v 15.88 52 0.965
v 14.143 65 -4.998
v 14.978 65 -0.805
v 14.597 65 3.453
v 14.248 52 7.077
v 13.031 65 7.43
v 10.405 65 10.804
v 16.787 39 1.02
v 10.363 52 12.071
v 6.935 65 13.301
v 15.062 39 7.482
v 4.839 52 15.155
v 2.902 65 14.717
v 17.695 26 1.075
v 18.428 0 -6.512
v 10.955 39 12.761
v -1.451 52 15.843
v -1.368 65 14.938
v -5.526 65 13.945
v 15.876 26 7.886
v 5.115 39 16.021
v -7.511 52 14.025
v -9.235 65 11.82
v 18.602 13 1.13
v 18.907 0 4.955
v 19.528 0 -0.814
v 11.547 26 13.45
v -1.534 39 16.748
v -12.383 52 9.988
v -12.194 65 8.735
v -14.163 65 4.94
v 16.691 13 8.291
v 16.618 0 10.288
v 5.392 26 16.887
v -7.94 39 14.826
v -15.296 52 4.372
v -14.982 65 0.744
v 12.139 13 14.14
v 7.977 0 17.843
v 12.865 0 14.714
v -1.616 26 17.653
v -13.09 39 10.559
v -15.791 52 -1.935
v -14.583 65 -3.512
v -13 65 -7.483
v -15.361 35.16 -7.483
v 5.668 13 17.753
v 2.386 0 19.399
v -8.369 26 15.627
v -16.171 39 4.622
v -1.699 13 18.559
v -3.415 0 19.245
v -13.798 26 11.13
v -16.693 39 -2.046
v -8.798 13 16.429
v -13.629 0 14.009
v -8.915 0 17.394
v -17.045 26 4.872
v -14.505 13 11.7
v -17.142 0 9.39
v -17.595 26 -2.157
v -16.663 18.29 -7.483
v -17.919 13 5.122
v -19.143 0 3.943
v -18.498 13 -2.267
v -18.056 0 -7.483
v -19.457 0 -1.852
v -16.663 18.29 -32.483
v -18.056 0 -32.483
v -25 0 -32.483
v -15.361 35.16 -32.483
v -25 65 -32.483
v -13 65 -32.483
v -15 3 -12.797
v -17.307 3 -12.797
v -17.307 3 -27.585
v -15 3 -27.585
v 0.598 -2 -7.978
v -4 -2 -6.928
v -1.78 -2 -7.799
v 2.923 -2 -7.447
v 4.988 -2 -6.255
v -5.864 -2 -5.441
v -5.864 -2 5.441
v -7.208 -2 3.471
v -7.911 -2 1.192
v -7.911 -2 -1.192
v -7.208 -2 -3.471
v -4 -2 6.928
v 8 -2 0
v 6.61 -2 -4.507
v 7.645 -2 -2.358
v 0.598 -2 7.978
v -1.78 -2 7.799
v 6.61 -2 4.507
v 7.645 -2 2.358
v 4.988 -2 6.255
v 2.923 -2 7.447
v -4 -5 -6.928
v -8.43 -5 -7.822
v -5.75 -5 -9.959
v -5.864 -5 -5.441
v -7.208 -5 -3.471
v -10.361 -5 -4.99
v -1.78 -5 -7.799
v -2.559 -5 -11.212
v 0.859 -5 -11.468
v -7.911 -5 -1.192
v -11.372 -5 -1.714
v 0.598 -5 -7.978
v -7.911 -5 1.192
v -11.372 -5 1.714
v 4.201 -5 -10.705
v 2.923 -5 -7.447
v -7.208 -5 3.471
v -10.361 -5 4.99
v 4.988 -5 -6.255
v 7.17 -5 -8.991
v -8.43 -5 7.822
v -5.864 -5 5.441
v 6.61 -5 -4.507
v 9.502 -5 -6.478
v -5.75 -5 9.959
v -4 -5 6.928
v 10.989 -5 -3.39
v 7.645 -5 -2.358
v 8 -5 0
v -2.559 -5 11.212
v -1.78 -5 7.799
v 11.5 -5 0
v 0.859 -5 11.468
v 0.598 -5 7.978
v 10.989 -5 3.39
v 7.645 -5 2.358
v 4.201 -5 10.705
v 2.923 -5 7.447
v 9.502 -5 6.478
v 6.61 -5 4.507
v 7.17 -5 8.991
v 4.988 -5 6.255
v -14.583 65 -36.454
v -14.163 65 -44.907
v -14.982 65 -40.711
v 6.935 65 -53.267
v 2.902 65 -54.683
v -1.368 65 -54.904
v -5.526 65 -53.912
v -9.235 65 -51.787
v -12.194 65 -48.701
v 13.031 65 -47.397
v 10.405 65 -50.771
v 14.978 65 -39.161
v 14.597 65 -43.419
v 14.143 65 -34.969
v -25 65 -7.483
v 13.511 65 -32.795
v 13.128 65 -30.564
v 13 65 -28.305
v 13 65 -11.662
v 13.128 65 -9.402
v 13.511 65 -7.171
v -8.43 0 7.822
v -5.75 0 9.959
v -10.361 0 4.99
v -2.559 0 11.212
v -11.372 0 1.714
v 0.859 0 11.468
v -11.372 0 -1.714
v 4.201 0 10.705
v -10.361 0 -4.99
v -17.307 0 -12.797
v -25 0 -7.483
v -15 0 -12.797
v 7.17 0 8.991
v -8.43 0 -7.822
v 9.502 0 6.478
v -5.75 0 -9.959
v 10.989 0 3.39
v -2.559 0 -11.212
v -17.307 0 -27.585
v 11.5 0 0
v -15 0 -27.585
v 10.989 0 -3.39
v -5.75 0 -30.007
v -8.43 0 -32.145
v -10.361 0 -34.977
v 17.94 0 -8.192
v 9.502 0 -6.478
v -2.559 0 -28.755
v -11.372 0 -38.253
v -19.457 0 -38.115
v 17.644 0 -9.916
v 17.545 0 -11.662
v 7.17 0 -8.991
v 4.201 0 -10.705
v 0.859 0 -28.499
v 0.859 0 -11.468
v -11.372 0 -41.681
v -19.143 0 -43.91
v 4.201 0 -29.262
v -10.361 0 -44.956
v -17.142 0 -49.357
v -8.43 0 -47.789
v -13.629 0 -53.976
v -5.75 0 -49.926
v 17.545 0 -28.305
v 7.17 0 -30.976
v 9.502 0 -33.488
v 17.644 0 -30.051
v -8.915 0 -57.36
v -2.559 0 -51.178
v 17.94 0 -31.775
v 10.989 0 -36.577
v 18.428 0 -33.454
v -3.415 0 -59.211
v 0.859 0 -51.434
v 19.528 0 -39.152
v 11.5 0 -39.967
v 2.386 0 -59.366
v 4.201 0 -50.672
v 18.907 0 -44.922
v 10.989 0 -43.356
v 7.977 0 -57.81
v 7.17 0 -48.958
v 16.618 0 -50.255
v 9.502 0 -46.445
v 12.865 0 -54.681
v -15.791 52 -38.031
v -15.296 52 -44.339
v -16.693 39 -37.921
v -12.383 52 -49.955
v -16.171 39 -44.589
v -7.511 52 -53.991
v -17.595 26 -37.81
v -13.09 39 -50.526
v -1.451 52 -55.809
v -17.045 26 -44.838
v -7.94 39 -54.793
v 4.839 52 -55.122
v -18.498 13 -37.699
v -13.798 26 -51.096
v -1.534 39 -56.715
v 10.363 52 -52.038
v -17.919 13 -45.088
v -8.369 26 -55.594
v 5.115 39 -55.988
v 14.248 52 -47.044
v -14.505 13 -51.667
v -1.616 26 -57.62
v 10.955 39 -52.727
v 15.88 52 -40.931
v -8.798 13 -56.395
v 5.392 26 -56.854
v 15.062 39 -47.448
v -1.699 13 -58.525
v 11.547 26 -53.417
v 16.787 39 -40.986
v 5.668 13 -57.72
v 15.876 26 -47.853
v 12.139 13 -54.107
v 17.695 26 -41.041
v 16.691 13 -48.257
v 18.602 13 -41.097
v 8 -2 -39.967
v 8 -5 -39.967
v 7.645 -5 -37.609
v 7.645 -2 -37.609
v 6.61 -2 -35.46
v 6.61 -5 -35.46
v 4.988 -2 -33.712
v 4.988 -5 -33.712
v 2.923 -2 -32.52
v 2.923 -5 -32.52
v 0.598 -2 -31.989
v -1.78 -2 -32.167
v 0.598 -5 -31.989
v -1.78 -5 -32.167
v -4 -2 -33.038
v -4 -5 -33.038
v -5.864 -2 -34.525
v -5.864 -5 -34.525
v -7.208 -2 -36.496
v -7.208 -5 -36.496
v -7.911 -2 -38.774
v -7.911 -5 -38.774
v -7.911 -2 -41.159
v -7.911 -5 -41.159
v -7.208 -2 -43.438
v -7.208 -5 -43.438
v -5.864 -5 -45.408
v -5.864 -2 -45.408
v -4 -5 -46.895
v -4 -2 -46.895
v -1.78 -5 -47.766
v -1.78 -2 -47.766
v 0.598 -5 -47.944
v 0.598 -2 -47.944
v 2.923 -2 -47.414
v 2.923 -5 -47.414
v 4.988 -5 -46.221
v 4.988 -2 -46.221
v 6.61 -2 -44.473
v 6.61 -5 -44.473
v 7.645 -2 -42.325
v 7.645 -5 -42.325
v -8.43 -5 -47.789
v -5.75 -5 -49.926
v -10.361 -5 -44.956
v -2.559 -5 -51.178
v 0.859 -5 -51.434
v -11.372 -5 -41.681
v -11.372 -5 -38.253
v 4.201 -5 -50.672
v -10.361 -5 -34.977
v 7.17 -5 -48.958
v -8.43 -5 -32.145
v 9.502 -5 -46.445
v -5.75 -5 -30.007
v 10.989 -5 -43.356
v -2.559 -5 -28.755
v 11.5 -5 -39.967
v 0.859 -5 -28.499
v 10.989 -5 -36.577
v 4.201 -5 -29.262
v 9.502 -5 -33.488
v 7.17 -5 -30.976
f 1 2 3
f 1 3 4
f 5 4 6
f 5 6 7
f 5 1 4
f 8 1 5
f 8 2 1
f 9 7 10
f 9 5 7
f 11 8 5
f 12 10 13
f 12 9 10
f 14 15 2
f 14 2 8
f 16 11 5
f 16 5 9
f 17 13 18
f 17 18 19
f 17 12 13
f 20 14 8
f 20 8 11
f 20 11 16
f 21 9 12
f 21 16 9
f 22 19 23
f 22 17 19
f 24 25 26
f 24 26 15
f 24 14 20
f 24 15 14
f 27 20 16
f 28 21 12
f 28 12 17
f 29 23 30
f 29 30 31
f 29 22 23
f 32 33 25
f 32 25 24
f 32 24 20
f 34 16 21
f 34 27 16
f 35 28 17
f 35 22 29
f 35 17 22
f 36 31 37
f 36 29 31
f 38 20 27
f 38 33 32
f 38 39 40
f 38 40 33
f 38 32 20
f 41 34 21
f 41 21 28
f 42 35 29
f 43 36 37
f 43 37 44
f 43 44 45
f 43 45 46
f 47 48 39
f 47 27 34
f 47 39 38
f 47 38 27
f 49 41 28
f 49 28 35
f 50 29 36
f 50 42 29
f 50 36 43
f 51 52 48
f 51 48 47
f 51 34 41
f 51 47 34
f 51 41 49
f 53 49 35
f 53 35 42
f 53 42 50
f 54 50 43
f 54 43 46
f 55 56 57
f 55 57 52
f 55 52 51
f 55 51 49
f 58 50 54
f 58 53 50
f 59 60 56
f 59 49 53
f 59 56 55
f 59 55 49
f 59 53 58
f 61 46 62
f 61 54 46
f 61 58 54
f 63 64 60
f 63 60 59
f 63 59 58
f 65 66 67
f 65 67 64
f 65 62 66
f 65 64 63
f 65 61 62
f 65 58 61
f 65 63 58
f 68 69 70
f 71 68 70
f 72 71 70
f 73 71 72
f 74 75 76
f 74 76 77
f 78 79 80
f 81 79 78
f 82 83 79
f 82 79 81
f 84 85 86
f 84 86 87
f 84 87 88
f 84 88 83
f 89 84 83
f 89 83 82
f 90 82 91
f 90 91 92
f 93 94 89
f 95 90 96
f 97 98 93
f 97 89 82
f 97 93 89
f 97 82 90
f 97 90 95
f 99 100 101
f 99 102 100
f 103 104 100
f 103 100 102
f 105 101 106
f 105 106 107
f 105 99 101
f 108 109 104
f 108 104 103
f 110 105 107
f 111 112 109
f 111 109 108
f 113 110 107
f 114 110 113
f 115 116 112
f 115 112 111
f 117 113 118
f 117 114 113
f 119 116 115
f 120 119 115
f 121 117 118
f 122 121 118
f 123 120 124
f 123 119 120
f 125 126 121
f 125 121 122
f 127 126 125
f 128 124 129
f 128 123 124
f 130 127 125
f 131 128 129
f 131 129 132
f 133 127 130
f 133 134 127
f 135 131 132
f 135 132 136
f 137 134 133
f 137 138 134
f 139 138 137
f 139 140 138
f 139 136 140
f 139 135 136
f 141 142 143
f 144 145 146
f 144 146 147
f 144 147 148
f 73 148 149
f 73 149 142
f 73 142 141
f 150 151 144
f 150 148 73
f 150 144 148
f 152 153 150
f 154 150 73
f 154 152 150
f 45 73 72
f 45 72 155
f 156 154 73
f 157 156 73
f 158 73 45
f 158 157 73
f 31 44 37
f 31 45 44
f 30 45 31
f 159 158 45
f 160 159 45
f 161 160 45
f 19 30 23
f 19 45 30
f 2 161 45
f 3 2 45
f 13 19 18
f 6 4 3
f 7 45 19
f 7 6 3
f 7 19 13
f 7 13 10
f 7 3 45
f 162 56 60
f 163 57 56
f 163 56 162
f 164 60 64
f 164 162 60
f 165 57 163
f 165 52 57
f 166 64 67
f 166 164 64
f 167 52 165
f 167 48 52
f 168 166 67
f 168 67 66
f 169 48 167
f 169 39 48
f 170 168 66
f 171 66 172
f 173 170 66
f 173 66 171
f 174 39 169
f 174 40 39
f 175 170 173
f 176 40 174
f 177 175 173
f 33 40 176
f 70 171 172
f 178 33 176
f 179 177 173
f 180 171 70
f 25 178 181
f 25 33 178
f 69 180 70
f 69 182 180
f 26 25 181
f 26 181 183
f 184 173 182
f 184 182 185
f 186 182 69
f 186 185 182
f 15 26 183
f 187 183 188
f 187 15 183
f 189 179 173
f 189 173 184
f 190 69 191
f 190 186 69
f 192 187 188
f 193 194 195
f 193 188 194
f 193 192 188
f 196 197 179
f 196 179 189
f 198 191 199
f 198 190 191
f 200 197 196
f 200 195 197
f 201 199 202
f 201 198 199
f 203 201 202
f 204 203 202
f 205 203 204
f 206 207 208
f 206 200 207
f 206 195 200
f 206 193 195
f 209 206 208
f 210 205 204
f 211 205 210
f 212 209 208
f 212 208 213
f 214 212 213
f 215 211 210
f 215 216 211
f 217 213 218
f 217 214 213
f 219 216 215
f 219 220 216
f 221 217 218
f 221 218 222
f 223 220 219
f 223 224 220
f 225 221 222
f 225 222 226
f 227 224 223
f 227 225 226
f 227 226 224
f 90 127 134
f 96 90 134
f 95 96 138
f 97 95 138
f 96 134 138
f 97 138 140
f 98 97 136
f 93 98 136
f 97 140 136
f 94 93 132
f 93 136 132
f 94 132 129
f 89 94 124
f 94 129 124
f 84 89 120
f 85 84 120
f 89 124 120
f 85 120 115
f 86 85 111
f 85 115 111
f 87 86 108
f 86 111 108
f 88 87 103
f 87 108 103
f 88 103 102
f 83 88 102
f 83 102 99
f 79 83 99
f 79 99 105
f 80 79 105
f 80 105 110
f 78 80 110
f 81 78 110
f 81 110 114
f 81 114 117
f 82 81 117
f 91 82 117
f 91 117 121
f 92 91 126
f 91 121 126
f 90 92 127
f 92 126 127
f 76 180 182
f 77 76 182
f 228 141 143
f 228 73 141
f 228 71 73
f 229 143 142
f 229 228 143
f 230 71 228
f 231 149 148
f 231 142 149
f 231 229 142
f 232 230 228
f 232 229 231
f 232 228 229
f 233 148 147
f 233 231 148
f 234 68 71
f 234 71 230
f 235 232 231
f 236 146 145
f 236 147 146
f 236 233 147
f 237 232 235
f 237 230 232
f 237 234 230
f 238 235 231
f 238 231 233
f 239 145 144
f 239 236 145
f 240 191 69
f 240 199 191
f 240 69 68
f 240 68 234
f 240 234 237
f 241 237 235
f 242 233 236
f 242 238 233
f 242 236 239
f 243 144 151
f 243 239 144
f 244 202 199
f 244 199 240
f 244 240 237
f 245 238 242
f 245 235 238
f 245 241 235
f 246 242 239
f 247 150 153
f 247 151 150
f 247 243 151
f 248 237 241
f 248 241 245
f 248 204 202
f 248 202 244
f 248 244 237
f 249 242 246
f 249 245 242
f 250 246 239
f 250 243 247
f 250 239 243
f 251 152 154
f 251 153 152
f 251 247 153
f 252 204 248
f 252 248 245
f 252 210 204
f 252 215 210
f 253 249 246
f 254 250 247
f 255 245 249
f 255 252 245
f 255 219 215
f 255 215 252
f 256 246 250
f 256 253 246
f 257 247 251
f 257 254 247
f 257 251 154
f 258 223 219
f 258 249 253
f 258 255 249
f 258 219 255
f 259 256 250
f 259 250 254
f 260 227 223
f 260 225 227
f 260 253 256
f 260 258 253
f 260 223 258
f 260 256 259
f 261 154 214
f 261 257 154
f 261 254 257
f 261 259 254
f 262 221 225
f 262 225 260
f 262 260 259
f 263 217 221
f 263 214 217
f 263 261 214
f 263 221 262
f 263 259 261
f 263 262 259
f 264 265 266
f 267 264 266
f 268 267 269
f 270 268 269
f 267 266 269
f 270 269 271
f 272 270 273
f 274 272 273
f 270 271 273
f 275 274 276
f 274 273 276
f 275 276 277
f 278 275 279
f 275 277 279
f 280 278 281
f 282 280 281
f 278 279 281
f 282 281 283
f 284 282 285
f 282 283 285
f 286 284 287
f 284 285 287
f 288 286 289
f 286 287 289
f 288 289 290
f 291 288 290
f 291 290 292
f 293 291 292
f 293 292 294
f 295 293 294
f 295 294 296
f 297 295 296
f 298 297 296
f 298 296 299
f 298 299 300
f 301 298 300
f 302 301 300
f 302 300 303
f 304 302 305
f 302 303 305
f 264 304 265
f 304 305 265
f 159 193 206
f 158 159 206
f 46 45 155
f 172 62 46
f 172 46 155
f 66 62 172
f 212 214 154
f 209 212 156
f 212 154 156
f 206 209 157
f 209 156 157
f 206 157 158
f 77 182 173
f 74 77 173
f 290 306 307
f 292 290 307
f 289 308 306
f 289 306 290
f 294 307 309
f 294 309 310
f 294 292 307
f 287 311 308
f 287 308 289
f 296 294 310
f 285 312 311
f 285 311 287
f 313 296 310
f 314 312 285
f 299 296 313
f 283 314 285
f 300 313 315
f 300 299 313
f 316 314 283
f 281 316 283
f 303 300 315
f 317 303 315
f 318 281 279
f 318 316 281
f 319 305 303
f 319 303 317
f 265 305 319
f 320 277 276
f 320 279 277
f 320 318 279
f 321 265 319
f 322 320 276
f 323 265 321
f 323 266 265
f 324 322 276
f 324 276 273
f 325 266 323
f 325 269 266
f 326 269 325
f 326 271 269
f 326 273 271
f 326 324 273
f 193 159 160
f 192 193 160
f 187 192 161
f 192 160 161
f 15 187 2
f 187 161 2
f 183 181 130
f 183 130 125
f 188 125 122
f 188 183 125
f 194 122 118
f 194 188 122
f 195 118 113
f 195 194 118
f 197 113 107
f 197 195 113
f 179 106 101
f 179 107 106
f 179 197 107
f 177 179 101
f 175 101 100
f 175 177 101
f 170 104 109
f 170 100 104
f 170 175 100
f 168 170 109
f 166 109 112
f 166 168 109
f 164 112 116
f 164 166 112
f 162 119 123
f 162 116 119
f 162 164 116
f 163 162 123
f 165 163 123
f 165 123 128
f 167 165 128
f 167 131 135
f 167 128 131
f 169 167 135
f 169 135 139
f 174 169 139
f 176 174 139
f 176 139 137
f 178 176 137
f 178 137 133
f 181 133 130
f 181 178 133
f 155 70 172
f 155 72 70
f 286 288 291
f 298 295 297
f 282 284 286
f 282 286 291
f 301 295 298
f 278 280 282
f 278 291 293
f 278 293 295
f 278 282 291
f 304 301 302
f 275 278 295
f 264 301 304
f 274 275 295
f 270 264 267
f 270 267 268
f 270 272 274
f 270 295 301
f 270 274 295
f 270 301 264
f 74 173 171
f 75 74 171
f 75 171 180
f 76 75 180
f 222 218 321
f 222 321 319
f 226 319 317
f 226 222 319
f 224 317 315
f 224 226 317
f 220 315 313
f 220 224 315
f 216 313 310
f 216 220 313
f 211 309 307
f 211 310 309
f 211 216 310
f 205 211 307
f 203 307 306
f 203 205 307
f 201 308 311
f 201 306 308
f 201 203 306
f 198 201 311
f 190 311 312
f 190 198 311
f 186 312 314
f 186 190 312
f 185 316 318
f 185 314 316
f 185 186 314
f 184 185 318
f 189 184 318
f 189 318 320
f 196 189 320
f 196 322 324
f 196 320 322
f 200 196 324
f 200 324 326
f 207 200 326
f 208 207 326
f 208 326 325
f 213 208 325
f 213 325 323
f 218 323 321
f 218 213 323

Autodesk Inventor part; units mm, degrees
ref_plane "YZ Plane" through (0, 0, 0) normal (1, 0, 0) x (0, 1, 0)
ref_plane "XZ Plane" through (0, 0, 0) normal (0, 1, 0) x (-1, 0, 0)
ref_plane "XY Plane" through (0, 0, 0) normal (0, 0, 1) x (1, 0, 0)
sketch "Esquisse7" plane through (0, 0, 0) normal (0, 1, 0) x (-1, 0, 0)
  circle A0 centre (0, 0) radius 15
  circle A1 centre (0, -39.9666) radius 15
  line L0 (13, -7.4833) -> (-13, -7.4833)
  line L1 (-13, -7.4833) -> (-13, -32.4833)
  line L2 (-13, -32.4833) -> (13, -32.4833)
  line L3 (13, -32.4833) -> (13, -7.4833)
  dimension "d39" = 30
  dimension "d40" = 25
  dimension "d41" = 26
extrude "Extrusion7" add sketch "Esquisse7" along normal blind 65
sketch "Esquisse8" plane through (-13, 0, -32.4833) normal (-1, 0, 0) x (0, 0, 1)
  line L0 (0, 0) -> (25, 0) construction
  line L1 (25, 0) -> (25, 65) construction
  line L2 (0, 65) -> (25, 65) construction
  line L3 (0, 0) -> (0, 65) construction
  line L4 (25, 0) -> (0, 0)
  line L5 (0, 0) -> (0, 65)
  line L6 (0, 65) -> (25, 65)
  line L7 (25, 65) -> (25, 0)
  point P0 (32.4833, 0)
extrude "Extrusion8" add sketch "Esquisse8" along normal blind 12
sketch "Esquisse9" plane through (0, 0, 0) normal (0, -1, 0) x (1, 0, 0)
  arc A0 (-13, -32.4833) -> (13, -32.4833) centre (0, -39.9666) ccw construction
  line L0 (13, -7.4833) -> (13, -32.4833) construction
  arc A1 (13, -7.4833) -> (-13, -7.4833) centre (0, 0) ccw construction
  line L1 (-13, -7.4833) -> (-25, -7.4833) construction
  line L2 (-25, -32.4833) -> (-25, -7.4833) construction
  line L3 (-13, -32.4833) -> (-25, -32.4833) construction
  line L4 (-13, -7.4833) -> (-25, -7.4833) construction
  line L5 (-15, -7.4833) -> (-15, -32.4833) construction
  line L6 (-13, -32.4833) -> (-25, -32.4833) construction
  line L7 (-15, -12.7966) -> (-17.3067, -12.7966)
  line L8 (-17.3067, -12.7966) -> (-17.3067, -27.5847)
  line L9 (-17.3067, -27.5847) -> (-15, -27.5847)
  line L10 (-15, -27.5847) -> (-15, -12.7966)
  point P0 (-15, -29.9833)
  dimension "d47" = 10
extrude "Extrusion9" cut sketch "Esquisse9" against normal blind 3
sketch "Esquisse10" plane through (0, 0, 0) normal (0, -1, 0) x (1, 0, 0)
  arc A0 (-13, -32.4833) -> (13, -32.4833) centre (0, -39.9666) ccw construction
  line L0 (13, -7.4833) -> (13, -32.4833) construction
  arc A1 (13, -7.4833) -> (-13, -7.4833) centre (0, 0) ccw construction
  line L1 (-13, -7.4833) -> (-25, -7.4833) construction
  line L2 (-25, -32.4833) -> (-25, -7.4833) construction
  line L3 (-13, -32.4833) -> (-25, -32.4833) construction
  circle A2 centre (0, 0) radius 11.5
  circle A3 centre (0, -39.9666) radius 11.5
  arc A4 (-13, -32.4833) -> (13, -32.4833) centre (0, -39.9666) ccw projected
  dimension "d58" = 23
extrude "Extrusion10" add sketch "Esquisse10" along normal blind 5
sketch "Esquisse11" plane through (0, -5, 0) normal (0, -1, 0) x (1, 0, 0)
  circle A0 centre (0, -39.9666) radius 11.5 construction
  circle A1 centre (0, 0) radius 11.5 construction
  circle A2 centre (0, 0) radius 8
  circle A3 centre (0, -39.9666) radius 8
  dimension "d54" = 16
extrude "Extrusion11" cut sketch "Esquisse11" against normal blind 3
fillet "Congé6" radius 20 2 edges at (13, 32.5, -7.4833) (13, 32.5, -32.4833)
draft "Dépouille de face1" angle 4 pull direction (0, 1, 0) faces at (13, 21.6667, -17.2095) (13.057, 21.6667, -29.813) (13.2275, 21.6667, -8.6539) (-14.4854, 43.3333, -43.862) (-14.0102, 43.3333, -5.3586) fixed edges at (13, 65, -19.9833) (13.2878, 65, -31.6853) (13.2878, 65, -8.2813) (-1.3678, 65, -54.9041) (-1.3678, 65, 14.9375)
properties part number "head1"
